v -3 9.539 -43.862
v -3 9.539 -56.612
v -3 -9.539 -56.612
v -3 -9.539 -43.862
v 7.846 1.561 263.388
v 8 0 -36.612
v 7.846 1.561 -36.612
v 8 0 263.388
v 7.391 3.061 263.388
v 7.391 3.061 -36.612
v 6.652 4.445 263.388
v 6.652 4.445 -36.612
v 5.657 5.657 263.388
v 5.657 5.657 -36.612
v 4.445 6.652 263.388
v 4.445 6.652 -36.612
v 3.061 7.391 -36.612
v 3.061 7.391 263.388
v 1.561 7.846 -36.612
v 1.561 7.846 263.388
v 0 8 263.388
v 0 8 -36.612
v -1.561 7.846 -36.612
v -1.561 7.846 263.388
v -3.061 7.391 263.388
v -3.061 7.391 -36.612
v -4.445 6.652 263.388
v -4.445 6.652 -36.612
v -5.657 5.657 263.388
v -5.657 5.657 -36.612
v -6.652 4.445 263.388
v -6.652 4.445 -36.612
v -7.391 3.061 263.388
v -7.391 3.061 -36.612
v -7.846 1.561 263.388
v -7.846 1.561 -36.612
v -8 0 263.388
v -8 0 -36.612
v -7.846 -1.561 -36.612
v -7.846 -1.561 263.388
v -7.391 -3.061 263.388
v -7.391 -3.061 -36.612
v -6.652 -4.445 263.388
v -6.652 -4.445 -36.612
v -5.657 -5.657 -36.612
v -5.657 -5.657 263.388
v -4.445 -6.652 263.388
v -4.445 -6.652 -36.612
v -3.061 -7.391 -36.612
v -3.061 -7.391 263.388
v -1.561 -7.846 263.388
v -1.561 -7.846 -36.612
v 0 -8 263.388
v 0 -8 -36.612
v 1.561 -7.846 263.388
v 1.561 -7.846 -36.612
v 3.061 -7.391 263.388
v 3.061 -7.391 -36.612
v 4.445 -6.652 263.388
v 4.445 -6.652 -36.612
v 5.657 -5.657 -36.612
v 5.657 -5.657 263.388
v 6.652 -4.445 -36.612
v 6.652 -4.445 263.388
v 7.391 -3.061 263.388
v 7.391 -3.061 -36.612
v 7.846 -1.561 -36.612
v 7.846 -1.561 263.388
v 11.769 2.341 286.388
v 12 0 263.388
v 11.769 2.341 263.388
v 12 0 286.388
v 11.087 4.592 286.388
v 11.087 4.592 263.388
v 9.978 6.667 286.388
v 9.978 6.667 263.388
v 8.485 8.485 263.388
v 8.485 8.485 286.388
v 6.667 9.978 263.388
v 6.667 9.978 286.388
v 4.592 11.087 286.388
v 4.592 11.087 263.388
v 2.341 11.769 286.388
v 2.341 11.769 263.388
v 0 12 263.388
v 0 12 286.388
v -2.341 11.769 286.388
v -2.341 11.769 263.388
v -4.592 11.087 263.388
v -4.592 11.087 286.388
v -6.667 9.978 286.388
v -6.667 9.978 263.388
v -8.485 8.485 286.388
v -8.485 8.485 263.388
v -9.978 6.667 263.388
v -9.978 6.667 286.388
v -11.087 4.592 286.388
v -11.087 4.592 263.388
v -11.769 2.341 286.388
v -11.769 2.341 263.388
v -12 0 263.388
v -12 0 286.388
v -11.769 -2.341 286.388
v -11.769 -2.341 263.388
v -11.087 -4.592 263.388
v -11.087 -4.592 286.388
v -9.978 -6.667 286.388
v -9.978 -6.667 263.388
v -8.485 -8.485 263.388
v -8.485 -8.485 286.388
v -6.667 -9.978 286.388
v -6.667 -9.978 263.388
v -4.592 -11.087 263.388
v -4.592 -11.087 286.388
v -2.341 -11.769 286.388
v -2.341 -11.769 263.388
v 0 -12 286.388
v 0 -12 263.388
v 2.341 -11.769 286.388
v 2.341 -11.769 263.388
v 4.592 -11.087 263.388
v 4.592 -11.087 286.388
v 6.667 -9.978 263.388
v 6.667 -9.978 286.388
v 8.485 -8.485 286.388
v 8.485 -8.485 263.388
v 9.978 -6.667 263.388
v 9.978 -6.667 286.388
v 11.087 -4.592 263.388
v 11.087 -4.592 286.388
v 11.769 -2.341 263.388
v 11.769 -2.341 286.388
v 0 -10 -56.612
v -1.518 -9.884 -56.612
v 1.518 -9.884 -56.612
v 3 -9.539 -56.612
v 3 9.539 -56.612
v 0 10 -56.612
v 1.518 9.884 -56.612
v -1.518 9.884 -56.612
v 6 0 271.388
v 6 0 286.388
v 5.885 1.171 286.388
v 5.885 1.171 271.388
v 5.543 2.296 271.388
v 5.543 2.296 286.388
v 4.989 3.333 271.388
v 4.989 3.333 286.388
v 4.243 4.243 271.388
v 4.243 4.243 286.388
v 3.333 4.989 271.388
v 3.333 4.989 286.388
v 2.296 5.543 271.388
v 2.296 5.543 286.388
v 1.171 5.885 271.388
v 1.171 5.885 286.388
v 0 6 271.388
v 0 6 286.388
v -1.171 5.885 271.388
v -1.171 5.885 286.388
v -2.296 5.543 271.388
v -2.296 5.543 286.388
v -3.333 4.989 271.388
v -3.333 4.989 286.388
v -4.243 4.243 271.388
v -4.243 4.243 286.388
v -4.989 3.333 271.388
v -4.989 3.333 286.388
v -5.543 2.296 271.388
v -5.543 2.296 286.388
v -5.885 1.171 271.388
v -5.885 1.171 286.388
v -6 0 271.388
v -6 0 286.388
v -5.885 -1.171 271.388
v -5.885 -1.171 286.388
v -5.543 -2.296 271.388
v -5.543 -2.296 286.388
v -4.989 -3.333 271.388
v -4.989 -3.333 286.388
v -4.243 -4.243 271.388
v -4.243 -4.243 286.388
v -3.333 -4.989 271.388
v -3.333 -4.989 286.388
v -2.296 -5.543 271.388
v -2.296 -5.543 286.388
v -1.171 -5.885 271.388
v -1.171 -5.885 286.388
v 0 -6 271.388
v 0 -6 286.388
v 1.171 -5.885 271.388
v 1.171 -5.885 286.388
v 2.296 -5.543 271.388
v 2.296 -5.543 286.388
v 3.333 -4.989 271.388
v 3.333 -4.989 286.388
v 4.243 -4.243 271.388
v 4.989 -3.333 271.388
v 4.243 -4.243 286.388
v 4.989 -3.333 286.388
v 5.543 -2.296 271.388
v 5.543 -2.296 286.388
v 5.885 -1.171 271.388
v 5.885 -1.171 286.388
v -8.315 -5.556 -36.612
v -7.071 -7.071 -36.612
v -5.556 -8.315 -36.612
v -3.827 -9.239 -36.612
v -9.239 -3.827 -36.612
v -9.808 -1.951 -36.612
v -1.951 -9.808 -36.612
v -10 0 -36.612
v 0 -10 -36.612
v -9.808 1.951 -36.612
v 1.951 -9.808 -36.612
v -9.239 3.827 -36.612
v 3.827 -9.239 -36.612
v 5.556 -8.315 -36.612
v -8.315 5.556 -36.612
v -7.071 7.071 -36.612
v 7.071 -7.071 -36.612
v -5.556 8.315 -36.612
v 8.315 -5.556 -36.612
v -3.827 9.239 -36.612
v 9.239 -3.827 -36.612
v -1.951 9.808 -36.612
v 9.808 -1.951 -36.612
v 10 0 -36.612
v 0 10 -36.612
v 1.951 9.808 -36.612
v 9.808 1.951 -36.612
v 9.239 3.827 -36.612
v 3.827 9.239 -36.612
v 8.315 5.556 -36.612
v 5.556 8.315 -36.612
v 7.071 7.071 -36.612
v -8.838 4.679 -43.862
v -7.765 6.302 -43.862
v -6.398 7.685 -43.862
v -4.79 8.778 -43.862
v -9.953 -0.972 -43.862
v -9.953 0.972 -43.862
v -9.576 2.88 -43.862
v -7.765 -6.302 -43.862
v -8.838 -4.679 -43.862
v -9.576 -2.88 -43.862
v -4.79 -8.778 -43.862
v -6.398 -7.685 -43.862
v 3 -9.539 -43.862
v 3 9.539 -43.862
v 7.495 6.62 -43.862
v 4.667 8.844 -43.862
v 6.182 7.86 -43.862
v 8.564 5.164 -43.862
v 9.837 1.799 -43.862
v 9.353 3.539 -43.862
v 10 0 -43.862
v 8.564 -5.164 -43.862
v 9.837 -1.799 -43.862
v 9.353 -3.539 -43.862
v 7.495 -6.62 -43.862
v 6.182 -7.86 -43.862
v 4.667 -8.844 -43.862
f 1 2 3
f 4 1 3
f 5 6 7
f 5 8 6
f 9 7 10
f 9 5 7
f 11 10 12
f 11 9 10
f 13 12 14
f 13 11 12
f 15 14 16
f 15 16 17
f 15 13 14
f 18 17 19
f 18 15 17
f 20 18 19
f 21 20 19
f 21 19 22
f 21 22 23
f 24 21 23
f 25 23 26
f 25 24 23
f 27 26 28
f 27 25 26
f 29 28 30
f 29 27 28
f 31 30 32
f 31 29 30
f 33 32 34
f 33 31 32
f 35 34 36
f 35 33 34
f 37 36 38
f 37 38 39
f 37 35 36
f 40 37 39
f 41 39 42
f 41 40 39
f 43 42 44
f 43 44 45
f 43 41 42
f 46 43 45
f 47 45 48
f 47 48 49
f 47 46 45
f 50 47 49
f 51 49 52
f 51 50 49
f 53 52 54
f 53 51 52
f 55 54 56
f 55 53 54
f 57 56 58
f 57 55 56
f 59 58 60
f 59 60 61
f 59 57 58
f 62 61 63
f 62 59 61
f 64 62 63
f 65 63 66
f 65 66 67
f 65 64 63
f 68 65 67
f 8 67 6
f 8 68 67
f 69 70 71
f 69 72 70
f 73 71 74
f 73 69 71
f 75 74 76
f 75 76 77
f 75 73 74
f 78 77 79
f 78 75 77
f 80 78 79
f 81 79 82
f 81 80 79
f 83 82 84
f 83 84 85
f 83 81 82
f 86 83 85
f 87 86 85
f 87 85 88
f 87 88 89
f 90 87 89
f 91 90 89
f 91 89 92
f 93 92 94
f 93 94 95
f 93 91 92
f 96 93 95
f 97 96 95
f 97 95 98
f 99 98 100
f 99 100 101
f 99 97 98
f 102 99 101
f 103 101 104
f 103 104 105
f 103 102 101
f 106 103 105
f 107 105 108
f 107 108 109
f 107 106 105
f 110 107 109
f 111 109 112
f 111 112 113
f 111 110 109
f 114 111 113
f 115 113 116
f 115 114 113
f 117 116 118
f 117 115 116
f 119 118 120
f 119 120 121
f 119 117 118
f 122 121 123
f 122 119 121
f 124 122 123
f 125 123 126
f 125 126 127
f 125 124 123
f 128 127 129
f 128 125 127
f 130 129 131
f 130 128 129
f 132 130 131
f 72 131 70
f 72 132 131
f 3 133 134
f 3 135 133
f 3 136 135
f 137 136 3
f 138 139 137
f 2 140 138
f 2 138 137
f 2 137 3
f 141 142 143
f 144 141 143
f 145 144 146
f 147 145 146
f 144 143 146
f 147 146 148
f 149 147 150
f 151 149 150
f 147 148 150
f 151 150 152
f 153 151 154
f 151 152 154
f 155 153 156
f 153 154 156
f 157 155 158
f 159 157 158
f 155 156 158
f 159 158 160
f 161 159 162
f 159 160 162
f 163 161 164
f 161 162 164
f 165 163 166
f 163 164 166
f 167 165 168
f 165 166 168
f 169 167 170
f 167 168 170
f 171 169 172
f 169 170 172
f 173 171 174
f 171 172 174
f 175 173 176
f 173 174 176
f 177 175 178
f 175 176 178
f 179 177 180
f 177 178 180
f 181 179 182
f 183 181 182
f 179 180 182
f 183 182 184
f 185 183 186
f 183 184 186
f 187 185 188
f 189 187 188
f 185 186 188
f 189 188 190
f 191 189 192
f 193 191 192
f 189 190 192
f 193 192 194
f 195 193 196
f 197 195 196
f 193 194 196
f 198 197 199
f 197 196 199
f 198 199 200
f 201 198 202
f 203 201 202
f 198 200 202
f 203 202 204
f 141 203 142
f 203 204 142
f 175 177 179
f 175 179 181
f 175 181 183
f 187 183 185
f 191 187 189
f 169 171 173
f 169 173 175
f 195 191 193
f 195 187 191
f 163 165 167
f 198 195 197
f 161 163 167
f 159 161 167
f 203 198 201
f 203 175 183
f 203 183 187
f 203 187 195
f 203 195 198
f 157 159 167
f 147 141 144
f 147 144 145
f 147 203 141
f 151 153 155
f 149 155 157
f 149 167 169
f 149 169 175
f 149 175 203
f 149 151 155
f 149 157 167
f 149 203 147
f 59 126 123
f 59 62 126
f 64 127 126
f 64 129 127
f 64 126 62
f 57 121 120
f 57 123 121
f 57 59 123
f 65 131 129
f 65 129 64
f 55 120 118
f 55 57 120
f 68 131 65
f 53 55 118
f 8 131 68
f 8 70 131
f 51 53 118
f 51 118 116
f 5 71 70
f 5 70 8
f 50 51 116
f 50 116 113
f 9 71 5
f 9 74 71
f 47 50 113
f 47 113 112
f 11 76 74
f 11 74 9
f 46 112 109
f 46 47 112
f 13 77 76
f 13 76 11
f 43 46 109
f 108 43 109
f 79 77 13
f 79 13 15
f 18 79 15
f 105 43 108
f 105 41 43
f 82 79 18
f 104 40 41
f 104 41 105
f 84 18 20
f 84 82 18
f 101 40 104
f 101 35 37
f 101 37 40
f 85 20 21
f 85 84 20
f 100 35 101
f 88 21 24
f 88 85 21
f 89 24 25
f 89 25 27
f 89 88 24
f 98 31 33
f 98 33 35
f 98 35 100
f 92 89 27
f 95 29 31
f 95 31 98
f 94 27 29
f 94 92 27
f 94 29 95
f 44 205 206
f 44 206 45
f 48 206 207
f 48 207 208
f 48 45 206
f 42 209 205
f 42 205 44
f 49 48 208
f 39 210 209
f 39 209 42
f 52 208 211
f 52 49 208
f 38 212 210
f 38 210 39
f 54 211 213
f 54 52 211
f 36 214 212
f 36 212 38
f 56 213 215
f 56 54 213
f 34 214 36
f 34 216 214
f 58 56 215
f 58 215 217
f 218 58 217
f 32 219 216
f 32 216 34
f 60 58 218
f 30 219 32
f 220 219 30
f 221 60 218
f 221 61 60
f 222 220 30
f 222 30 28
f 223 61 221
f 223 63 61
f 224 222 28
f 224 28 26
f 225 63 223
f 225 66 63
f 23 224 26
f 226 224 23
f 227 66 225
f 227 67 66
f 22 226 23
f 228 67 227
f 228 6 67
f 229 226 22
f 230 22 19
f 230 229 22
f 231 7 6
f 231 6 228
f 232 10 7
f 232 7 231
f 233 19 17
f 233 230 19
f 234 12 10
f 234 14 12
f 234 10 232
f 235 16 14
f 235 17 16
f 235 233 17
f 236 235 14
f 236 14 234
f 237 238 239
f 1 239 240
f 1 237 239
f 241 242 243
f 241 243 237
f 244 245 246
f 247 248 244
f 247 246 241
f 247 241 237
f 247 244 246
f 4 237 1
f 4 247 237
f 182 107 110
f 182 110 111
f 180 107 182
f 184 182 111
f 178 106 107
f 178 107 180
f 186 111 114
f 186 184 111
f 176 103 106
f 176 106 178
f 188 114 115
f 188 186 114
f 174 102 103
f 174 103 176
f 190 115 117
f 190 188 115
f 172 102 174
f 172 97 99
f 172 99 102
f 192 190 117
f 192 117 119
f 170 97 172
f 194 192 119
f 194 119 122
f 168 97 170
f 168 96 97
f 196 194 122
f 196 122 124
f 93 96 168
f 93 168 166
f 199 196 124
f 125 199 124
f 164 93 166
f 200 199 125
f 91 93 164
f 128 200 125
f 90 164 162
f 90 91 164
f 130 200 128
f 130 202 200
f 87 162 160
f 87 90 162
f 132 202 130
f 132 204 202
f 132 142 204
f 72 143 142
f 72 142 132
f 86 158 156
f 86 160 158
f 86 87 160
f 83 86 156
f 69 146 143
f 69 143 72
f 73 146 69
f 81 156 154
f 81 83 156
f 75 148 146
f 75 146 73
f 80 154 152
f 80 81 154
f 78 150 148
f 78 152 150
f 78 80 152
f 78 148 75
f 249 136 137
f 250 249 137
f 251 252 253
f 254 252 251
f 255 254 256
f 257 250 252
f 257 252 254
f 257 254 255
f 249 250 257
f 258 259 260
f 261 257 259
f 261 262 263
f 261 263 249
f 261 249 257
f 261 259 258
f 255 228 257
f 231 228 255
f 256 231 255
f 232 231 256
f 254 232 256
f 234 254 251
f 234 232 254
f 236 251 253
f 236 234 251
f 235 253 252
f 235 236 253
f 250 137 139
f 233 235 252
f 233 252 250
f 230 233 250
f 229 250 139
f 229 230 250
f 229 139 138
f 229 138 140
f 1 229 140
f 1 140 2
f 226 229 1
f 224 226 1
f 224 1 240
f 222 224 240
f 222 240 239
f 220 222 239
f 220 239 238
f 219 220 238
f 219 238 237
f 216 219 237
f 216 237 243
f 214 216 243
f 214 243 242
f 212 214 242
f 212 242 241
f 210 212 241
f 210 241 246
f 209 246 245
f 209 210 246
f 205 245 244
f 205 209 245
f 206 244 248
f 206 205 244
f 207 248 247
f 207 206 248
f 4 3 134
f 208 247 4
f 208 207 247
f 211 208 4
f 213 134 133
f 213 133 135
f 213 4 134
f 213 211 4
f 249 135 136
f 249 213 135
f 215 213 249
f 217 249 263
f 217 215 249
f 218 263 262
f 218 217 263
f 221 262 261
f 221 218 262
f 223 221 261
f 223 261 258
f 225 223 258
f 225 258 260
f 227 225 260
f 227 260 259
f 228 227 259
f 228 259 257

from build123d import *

# Parameters (mm, degrees)
F3_DEPTH = 12.75
F4_R     = 6
F5_DEPTH = 15


with BuildPart() as f1:
    # F0 (on Front) → F1 (revolve)
    with BuildSketch(Plane.XZ):
        Polygon((12, 286.387794), (0, 286.387794), (0, -56.612206), (10, -56.612206), (10, -36.612206), (8, -36.612206), (8, 263.387794), (12, 263.387794), align=None)
    revolve(axis=Axis((0, 0, 114.887794), (0, 0, 1)))

    # F2 (on face) → F3 (cut)
    with BuildSketch(Plane(origin=(0, 0, -56.612206), x_dir=(1, 0, 0), z_dir=(0, 0, -1))):
        with BuildLine():
            Line((3, 9.539392), (3, 0))
            Line((3, 0), (3, -9.539392))
            ThreePointArc((3, -9.539392), (8.062258, -5.91608), (10, 0))
            ThreePointArc((10, 0), (8.062258, 5.91608), (3, 9.539392))
        make_face()
        with BuildLine():
            Line((-3, -9.539392), (-3, 0))
            Line((-3, 0), (-3, 9.539392))
            ThreePointArc((-3, 9.539392), (-10, 0), (-3, -9.539392))
        make_face()
    extrude(amount=-F3_DEPTH, mode=Mode.SUBTRACT)

    # F4 (on face) → F5 (cut)
    with BuildSketch(Plane.XY.offset(286.387794)):
        Circle(F4_R)
    extrude(amount=-F5_DEPTH, mode=Mode.SUBTRACT)


solid = f1.part
